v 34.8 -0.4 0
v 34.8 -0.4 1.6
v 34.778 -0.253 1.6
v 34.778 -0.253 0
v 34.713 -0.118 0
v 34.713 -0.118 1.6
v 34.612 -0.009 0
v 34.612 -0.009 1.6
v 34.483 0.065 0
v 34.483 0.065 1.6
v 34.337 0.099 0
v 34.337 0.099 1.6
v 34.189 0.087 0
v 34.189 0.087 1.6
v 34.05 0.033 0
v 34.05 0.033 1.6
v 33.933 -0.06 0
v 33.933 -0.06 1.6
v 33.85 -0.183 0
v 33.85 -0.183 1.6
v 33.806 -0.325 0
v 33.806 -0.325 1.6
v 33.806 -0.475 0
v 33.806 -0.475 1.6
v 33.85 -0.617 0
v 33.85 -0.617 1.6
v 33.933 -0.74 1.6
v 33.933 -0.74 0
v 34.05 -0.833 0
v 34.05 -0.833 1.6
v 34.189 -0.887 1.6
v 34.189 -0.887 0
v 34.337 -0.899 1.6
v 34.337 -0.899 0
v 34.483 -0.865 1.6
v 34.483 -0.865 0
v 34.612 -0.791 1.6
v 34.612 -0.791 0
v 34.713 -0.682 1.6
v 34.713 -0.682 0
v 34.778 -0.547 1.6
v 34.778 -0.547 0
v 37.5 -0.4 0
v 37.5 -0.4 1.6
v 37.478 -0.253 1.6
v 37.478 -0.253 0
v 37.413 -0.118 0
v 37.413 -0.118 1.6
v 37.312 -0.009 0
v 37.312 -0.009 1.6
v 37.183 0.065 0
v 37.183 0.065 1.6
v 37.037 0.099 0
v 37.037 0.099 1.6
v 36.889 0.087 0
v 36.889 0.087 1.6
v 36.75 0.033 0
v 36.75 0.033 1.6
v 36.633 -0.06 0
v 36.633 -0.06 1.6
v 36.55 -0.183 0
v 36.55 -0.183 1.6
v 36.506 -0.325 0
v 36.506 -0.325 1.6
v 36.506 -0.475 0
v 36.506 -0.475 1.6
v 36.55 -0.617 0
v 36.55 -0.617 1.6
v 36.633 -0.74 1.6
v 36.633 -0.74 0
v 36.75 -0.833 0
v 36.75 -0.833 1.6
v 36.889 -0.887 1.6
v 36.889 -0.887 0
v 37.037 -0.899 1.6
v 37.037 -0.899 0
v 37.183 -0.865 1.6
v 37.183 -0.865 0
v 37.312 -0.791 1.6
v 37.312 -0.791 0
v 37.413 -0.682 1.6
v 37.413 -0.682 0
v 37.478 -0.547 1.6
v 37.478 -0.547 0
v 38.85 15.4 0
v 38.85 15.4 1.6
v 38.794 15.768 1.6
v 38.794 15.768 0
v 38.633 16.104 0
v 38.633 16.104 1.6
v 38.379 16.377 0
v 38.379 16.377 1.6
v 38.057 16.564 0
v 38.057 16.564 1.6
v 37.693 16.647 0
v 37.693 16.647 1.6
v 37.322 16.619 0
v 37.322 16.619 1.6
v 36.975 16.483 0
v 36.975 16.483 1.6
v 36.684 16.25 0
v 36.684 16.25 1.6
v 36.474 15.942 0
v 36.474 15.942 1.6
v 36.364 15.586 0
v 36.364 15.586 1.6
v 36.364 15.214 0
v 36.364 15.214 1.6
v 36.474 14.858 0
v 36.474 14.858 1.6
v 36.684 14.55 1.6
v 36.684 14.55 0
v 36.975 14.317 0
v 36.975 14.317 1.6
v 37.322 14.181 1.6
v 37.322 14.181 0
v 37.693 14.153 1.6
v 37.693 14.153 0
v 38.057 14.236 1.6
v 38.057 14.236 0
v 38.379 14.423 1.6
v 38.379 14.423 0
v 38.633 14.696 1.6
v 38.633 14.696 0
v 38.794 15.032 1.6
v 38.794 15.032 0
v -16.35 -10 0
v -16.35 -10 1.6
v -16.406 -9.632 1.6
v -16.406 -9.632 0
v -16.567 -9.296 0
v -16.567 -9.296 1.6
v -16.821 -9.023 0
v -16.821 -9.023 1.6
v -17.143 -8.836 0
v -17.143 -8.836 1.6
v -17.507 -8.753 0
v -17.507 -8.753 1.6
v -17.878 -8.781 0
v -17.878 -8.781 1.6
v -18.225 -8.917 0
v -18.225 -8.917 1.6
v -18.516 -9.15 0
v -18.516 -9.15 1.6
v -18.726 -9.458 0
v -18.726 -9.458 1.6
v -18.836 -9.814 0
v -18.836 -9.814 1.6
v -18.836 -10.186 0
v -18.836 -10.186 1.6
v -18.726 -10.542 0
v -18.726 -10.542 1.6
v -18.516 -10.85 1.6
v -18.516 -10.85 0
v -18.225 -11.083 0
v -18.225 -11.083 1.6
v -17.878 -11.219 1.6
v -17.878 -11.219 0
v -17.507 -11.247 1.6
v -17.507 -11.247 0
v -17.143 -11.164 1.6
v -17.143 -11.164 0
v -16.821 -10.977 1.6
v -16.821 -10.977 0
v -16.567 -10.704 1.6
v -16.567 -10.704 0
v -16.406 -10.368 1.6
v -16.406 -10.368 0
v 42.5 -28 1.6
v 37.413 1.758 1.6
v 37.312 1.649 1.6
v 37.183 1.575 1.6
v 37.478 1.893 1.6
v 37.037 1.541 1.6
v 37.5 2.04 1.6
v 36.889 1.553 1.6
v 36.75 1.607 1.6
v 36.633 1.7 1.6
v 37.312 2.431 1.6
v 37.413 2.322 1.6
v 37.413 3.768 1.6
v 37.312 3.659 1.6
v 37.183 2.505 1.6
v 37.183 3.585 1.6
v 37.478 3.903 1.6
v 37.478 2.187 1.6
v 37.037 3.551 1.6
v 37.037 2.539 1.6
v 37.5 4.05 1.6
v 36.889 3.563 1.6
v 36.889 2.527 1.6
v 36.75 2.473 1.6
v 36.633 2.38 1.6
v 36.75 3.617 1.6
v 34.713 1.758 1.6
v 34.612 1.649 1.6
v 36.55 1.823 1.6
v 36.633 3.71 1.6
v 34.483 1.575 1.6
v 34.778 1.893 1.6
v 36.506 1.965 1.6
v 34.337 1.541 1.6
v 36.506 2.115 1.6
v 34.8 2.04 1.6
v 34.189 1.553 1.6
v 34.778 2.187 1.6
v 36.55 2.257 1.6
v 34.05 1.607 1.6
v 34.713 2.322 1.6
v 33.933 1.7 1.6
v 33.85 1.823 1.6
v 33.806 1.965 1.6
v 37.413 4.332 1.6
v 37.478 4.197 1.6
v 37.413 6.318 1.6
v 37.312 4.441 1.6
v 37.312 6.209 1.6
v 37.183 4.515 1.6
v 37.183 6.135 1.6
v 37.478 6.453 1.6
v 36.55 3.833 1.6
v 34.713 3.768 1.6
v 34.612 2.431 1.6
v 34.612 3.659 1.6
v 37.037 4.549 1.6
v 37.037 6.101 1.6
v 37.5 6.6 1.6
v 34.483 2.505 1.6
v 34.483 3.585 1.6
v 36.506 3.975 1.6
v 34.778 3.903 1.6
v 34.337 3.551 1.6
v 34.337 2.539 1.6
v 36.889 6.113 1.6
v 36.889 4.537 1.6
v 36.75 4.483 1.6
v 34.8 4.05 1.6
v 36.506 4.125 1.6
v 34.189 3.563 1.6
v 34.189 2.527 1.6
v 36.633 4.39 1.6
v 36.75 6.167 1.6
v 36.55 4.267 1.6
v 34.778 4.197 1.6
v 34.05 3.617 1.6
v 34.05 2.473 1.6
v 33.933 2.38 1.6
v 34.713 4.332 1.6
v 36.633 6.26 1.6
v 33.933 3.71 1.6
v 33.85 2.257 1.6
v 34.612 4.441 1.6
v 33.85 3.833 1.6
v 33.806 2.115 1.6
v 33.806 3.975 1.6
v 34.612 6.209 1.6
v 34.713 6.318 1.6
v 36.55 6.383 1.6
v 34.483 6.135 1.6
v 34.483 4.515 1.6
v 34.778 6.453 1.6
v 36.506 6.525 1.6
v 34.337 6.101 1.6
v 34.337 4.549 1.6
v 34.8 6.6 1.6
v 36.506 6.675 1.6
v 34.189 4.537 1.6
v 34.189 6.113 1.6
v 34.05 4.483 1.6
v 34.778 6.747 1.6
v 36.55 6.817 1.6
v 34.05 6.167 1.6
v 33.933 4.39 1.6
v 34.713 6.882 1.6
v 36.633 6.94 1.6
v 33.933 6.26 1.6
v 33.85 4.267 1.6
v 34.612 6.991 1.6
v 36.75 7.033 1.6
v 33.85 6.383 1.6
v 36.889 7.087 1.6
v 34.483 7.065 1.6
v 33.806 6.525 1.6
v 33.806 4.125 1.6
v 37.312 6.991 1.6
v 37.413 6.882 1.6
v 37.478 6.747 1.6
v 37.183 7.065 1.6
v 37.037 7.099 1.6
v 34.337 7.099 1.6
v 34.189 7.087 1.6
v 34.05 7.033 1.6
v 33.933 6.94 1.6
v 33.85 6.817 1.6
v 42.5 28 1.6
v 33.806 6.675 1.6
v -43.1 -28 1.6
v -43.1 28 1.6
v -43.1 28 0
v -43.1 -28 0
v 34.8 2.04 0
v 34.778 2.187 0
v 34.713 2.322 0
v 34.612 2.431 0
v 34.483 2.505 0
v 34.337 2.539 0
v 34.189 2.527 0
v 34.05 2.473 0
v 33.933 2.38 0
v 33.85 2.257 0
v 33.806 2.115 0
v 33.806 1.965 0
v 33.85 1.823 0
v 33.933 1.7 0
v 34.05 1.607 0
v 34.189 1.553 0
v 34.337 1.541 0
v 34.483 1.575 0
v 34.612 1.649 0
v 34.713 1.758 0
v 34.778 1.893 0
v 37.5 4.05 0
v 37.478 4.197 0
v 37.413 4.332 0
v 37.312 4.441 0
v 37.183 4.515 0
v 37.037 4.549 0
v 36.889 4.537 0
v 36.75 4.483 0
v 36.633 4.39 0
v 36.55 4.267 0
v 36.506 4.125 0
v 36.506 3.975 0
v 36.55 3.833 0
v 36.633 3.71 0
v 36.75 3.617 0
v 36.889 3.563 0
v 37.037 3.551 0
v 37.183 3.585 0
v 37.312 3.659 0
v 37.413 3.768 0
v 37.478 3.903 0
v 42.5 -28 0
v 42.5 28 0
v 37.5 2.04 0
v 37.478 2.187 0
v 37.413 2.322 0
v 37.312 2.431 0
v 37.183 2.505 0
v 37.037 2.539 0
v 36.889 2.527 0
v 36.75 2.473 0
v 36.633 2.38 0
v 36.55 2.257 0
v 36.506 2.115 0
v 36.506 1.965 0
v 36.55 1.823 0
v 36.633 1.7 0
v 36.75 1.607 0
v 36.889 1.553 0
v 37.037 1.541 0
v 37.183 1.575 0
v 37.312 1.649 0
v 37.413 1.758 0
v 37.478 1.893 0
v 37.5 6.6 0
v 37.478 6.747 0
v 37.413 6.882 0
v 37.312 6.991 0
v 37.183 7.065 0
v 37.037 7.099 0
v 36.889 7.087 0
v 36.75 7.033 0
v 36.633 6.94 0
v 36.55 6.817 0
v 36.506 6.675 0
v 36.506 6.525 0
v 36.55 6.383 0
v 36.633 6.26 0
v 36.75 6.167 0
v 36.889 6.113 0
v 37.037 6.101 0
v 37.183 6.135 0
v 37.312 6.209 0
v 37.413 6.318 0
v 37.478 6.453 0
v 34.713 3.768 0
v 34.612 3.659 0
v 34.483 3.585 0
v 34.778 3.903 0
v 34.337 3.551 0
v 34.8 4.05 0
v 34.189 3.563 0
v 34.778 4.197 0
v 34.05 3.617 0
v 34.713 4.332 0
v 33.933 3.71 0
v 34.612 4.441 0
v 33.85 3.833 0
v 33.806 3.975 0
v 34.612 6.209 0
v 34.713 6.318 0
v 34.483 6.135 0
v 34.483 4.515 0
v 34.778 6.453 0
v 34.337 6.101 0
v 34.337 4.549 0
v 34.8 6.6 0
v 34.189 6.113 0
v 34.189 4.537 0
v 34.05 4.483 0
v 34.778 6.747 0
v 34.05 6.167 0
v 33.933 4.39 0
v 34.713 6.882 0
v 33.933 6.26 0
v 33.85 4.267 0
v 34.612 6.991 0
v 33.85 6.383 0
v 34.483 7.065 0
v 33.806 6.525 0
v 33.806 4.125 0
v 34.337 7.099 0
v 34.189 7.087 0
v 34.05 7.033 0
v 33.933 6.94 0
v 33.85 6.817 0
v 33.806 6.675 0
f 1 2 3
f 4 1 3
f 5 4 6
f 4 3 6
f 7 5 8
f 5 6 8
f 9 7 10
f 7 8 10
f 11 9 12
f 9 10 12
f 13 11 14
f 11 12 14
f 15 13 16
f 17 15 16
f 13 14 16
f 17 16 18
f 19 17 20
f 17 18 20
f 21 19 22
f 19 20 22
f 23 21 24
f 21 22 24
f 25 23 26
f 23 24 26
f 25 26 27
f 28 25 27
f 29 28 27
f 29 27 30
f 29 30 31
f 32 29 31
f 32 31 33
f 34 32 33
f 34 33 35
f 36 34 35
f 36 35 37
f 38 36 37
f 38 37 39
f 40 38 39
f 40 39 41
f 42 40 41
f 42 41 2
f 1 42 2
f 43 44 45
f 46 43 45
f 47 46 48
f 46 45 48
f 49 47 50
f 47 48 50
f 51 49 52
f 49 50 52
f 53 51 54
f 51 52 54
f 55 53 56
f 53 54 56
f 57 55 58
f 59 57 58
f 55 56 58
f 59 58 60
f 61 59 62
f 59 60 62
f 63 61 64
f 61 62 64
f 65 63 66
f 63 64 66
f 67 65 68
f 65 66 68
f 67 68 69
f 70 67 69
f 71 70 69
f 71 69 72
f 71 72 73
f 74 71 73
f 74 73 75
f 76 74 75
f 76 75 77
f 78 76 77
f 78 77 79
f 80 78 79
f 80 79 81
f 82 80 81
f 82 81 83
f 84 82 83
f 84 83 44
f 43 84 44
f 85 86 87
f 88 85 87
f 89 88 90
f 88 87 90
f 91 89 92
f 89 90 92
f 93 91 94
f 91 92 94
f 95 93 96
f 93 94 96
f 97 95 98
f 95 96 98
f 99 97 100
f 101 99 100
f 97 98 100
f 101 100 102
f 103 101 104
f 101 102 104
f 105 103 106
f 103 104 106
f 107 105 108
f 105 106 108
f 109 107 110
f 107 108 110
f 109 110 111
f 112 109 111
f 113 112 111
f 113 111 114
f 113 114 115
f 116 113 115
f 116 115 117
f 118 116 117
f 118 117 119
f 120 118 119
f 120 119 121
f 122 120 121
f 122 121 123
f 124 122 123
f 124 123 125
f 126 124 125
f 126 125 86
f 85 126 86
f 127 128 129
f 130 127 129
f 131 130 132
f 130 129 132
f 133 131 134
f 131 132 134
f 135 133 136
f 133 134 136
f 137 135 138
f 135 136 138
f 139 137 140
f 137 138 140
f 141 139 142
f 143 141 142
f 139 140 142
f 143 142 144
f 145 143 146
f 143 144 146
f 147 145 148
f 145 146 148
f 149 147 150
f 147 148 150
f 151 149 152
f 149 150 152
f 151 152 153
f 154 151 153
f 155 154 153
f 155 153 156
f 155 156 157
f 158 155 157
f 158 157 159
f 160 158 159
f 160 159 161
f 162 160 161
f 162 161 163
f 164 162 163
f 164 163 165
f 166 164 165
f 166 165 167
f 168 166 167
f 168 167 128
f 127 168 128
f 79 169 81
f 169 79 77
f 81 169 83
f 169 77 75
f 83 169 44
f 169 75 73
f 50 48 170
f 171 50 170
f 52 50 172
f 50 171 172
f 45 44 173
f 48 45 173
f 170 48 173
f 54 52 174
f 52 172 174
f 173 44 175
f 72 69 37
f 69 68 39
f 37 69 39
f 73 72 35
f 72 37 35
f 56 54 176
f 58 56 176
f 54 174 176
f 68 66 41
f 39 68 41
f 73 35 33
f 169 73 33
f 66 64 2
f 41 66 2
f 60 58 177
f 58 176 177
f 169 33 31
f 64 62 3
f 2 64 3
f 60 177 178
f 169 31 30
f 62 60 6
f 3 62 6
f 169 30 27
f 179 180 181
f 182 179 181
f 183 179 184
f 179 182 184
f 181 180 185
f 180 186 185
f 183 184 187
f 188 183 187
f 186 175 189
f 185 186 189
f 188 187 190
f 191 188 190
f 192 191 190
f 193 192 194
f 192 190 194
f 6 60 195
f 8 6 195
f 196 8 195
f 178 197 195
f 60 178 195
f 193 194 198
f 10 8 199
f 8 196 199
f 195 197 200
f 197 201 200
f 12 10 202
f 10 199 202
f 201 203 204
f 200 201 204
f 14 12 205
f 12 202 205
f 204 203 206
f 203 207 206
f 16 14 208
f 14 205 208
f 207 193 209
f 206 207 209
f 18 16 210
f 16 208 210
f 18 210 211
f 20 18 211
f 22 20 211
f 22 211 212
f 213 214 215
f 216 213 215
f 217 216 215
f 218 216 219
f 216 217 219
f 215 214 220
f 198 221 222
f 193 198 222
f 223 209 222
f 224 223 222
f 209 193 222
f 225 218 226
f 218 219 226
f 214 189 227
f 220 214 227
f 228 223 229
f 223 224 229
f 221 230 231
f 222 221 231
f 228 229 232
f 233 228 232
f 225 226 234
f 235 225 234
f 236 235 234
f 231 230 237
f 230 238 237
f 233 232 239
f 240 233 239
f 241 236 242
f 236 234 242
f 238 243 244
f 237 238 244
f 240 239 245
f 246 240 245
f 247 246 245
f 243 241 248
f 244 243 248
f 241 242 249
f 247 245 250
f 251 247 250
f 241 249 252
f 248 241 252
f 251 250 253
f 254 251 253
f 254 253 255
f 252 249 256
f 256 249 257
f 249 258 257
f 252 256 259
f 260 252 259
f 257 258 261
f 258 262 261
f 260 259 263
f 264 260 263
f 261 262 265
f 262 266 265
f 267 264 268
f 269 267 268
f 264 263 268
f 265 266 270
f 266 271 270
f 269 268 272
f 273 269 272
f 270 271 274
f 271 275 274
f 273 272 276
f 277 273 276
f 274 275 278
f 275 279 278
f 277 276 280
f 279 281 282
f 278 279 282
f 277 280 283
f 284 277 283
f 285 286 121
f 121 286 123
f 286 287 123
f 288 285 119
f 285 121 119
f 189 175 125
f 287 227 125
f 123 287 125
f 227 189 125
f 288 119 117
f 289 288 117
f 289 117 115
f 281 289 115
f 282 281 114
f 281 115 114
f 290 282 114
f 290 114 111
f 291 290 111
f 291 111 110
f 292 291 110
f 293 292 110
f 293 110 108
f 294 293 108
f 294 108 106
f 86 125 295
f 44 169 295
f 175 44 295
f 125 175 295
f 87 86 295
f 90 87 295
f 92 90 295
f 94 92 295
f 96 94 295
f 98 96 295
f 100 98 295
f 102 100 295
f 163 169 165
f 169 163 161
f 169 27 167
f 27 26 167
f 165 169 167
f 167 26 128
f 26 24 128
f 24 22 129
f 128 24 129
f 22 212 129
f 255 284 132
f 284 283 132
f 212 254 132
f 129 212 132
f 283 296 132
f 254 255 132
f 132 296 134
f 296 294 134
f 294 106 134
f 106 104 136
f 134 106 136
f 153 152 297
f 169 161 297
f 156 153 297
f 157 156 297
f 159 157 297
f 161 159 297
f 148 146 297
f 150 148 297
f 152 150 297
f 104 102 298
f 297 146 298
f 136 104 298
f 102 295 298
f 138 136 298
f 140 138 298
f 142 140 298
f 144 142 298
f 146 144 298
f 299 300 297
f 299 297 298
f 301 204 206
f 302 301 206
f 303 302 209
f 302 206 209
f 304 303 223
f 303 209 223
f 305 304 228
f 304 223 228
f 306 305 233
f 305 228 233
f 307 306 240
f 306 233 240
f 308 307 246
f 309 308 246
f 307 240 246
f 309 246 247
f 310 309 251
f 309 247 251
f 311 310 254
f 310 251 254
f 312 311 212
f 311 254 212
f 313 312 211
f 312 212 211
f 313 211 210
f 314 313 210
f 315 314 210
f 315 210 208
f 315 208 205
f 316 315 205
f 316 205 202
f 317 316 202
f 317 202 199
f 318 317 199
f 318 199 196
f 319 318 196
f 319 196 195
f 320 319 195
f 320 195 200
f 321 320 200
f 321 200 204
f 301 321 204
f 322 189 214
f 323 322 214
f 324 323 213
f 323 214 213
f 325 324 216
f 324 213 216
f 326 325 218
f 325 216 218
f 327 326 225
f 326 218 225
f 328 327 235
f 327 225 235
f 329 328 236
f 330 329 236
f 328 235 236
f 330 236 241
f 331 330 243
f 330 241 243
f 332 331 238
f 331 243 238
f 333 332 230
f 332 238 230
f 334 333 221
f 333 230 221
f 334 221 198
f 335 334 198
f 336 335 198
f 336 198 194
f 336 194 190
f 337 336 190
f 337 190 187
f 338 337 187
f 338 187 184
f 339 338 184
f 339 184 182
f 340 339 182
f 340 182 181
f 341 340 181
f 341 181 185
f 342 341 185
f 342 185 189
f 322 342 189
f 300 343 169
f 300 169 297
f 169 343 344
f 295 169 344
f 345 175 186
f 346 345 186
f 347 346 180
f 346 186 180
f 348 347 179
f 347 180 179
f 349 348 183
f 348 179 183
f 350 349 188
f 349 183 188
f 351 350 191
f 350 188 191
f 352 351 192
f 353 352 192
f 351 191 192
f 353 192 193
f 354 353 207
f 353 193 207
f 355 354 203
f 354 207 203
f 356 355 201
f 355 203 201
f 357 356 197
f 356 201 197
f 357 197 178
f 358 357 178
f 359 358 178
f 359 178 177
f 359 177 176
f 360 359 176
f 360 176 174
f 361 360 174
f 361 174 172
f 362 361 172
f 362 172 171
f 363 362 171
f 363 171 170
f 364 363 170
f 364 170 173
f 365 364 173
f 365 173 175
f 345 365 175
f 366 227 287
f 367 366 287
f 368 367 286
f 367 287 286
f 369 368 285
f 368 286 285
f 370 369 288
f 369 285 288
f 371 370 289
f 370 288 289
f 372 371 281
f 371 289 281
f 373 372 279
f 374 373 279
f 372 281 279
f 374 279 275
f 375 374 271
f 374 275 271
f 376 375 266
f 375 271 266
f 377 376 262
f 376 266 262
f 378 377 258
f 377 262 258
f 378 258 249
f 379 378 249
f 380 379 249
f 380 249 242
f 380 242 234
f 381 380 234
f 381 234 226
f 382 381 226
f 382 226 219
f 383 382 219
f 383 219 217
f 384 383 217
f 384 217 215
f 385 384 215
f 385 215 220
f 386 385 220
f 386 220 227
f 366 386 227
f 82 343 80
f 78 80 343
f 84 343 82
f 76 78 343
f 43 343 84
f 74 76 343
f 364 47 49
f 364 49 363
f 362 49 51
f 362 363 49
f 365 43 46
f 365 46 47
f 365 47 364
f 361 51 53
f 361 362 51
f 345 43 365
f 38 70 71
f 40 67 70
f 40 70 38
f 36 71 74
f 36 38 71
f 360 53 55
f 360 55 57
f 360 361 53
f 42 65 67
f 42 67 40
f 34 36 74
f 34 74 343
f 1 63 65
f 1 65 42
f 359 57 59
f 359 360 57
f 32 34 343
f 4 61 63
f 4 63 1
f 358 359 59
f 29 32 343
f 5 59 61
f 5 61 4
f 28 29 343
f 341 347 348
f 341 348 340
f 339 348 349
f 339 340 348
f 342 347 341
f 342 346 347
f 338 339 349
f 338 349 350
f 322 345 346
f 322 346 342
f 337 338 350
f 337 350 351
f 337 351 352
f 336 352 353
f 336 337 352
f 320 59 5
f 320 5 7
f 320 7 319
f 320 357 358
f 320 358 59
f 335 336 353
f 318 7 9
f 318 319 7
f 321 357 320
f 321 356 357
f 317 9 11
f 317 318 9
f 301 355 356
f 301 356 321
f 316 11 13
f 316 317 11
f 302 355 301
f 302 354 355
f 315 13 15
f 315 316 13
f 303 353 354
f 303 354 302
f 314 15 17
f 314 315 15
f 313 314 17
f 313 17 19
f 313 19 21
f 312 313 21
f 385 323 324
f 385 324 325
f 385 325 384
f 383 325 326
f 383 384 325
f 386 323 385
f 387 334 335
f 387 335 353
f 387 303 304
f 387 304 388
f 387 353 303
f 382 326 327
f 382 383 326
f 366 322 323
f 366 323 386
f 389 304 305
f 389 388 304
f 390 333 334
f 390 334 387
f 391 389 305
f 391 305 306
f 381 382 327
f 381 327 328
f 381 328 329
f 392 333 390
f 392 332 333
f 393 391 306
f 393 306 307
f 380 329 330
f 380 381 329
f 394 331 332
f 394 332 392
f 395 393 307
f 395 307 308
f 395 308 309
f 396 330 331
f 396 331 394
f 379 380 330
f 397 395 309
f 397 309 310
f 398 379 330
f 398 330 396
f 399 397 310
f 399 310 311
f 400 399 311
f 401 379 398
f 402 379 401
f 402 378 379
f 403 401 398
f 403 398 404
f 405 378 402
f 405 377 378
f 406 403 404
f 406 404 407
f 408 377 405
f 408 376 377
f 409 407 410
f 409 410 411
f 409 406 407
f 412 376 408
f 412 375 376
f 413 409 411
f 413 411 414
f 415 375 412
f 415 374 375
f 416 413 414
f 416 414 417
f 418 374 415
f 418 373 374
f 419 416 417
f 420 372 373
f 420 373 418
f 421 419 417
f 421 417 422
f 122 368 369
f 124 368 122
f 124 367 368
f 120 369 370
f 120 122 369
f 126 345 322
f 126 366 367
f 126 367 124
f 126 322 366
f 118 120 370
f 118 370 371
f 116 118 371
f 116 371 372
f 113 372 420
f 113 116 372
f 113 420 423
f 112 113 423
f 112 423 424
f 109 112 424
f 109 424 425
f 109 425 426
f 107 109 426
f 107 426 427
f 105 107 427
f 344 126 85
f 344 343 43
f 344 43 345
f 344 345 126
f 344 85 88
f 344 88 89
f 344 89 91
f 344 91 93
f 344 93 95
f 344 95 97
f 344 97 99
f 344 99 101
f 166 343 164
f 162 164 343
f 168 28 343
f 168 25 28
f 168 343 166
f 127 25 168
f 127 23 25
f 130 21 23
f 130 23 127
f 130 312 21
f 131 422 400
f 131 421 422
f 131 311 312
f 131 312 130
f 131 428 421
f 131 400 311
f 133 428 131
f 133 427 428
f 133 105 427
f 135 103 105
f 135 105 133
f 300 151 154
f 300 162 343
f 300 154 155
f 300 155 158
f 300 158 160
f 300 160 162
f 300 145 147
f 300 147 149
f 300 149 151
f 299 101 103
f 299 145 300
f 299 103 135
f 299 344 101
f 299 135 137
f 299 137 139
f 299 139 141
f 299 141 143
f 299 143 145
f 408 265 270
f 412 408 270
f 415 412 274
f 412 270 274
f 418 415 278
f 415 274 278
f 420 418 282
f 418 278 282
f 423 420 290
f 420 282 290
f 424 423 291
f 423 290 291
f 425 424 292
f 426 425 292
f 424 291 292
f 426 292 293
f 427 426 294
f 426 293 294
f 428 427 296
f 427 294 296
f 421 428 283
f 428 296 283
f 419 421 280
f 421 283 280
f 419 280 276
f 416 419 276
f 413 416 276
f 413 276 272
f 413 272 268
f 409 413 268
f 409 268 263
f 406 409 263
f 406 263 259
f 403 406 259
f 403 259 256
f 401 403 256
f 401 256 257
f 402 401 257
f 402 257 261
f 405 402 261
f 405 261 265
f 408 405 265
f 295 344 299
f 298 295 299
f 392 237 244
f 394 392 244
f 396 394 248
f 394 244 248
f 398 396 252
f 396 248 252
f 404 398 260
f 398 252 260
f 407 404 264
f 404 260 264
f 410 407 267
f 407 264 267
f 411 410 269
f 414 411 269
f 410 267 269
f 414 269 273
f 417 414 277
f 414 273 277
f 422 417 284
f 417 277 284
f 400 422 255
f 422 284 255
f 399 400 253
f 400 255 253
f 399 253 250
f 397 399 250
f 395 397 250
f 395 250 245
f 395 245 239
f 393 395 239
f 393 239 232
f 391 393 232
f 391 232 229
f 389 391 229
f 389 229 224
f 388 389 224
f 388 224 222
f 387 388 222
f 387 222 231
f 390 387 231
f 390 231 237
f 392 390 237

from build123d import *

# Parameters (mm, degrees)
ESBO_O1_W                = 85.6
ESBO_O1_H                = 56
RESSALTO_EXTRUS_O1_DEPTH = 1.6
ESBO_O2_R                = 0.5
CORTE_EXTRUS_O1_DEPTH    = 2
ESBO_O3_R                = 1.25
CORTE_EXTRUS_O2_DEPTH    = 10


with BuildPart() as part:
    # Esboço1 → Ressalto-extrusão1 (new body)
    with BuildSketch(Plane(origin=(0, 0, 0), x_dir=(-1, 0, 0), z_dir=(0, 0, -1))):
        with Locations((0.3, 0)):
            Rectangle(ESBO_O1_W, ESBO_O1_H)
    extrude(amount=-RESSALTO_EXTRUS_O1_DEPTH)

    # Esboço2 → Corte-extrusão1 (cut)
    with BuildSketch(Plane.XY.offset(1.6)):
        with Locations((37, 6.6)):
            Circle(ESBO_O2_R)
        with Locations((34.3, 6.6)):
            Circle(ESBO_O2_R)
        with Locations((34.3, 4.05)):
            Circle(ESBO_O2_R)
        with Locations((34.3, 2.04)):
            Circle(ESBO_O2_R)
        with Locations((34.3, -0.4)):
            Circle(ESBO_O2_R)
        with Locations((37, 4.05)):
            Circle(ESBO_O2_R)
        with Locations((37, 2.04)):
            Circle(ESBO_O2_R)
        with Locations((37, -0.4)):
            Circle(ESBO_O2_R)
    extrude(amount=-CORTE_EXTRUS_O1_DEPTH, mode=Mode.SUBTRACT)

    # Esboço3 → Corte-extrusão2 (cut)
    with BuildSketch(Plane.XY.offset(1.6)):
        with Locations((37.6, 15.4)):
            Circle(ESBO_O3_R)
        with Locations((-17.6, -10)):
            Circle(ESBO_O3_R)
    extrude(amount=-CORTE_EXTRUS_O2_DEPTH, mode=Mode.SUBTRACT)


solid = part.part
